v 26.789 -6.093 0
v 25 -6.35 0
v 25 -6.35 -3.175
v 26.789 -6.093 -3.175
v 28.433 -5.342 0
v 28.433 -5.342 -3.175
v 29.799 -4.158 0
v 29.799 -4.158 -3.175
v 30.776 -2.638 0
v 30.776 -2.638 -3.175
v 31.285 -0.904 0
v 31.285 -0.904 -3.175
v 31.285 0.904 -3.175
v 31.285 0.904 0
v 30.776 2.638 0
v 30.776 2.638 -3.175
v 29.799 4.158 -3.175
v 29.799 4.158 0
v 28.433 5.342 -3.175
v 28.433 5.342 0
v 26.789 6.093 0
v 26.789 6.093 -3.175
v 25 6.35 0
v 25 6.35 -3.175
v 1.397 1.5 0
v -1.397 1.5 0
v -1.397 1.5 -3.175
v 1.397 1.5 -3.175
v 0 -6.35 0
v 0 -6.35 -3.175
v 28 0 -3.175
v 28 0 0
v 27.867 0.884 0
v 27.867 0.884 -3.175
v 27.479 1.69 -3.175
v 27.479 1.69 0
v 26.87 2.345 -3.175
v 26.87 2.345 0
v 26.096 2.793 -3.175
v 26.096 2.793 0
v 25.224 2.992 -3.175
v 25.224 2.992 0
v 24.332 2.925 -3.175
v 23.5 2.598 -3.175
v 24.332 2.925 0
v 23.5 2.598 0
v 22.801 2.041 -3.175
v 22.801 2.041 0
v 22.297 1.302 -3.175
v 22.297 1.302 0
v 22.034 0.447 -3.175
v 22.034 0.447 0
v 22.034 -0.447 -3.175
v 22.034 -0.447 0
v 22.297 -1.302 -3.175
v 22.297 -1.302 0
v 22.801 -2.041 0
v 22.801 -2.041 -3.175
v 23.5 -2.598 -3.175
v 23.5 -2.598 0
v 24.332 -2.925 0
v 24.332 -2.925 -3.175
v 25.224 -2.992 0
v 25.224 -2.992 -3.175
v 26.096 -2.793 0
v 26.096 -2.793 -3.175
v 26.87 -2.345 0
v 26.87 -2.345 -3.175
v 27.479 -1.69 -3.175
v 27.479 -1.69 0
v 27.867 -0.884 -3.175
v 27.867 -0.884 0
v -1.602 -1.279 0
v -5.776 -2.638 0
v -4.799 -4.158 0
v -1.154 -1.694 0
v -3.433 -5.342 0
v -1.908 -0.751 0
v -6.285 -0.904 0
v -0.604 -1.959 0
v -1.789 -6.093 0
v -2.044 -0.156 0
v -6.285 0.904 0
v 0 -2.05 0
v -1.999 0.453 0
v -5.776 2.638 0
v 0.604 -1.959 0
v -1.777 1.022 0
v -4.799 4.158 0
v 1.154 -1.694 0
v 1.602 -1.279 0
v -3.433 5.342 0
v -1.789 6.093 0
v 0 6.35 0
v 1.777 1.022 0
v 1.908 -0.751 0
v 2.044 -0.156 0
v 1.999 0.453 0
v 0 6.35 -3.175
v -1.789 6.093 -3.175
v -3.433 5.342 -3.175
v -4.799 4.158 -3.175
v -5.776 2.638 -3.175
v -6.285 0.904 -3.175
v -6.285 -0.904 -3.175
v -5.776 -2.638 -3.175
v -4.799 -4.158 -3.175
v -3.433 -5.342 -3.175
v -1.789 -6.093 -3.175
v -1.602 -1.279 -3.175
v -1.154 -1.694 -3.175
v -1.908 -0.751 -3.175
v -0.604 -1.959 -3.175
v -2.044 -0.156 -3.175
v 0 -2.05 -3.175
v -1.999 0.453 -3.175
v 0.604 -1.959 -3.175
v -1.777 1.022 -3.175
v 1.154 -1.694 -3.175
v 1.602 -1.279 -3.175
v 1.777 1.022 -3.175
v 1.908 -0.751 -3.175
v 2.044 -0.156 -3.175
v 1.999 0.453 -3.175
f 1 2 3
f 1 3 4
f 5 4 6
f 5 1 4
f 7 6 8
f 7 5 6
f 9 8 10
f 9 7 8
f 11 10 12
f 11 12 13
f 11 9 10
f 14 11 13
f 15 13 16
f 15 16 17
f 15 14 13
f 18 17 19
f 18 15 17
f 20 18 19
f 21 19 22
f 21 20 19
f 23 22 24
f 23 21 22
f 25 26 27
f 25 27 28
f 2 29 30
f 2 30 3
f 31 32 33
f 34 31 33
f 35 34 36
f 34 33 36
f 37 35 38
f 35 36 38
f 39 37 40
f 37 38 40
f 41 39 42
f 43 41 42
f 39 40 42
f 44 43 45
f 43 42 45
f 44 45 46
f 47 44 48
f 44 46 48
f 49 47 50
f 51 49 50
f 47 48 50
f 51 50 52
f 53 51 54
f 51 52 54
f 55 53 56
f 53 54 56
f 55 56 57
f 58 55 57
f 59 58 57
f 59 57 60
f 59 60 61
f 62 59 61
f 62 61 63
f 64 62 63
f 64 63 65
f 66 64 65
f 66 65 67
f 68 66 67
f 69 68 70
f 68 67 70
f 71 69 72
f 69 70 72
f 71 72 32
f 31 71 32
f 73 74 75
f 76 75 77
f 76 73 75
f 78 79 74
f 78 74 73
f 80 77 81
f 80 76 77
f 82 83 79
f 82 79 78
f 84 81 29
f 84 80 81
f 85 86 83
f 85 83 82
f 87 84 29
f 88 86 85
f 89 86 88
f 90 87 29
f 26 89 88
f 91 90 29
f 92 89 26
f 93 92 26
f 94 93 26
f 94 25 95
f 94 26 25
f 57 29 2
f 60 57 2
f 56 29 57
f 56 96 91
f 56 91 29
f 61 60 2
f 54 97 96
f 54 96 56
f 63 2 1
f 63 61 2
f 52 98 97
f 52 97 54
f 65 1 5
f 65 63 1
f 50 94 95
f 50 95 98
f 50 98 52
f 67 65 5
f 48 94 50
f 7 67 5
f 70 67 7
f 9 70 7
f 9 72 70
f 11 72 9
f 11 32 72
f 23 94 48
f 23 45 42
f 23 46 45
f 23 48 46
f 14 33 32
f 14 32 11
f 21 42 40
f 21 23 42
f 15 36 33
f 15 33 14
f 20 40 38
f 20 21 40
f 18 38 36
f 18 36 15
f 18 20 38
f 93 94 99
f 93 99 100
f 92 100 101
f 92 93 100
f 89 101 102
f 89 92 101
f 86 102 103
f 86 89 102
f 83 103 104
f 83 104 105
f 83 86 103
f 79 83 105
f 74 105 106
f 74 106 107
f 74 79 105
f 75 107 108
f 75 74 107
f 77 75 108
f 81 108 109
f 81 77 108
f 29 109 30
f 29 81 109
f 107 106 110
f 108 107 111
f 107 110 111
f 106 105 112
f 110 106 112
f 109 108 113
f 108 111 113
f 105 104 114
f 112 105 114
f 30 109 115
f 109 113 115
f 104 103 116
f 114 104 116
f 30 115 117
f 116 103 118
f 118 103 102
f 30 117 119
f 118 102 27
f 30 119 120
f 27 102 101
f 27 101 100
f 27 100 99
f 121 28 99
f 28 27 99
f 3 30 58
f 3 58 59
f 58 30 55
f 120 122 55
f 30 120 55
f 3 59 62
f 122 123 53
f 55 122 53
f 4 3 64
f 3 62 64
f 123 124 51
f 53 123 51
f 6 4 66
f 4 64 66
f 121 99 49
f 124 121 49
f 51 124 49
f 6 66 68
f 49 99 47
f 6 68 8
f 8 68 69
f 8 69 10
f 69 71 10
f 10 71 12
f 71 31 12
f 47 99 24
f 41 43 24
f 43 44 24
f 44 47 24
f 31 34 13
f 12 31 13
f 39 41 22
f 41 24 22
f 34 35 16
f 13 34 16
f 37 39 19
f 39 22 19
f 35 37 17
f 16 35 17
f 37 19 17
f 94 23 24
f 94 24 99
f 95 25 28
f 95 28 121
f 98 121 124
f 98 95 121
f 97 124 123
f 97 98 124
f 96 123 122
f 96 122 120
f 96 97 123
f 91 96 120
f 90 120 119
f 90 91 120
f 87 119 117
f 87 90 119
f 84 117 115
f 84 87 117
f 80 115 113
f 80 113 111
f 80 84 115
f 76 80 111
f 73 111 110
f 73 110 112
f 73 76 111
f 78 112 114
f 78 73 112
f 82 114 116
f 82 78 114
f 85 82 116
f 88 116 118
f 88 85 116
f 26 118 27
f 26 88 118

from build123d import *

# Parameters (mm, degrees)
SKETCH1_R      = 3
EXTRUDE1_DEPTH = 3.175


with BuildPart() as part:
    # Sketch1 → Extrude1 (new body)
    with BuildSketch(Plane.XY):
        with BuildLine():
            Line((25, 6.35), (0, 6.35))
            ThreePointArc((0, 6.35), (-6.35, 0), (0, -6.35))
            Line((0, -6.35), (25, -6.35))
            ThreePointArc((25, -6.35), (31.35, 0), (25, 6.35))
        make_face()
        with Locations((25, 0)):
            Circle(SKETCH1_R, mode=Mode.SUBTRACT)
        with BuildLine():
            Line((-1.397318861, 1.5), (1.397318861, 1.5))
            ThreePointArc((1.397318861, 1.5), (0, -2.05), (-1.397318861, 1.5))
        make_face(mode=Mode.SUBTRACT)
    extrude(amount=-EXTRUDE1_DEPTH)


solid = part.part
